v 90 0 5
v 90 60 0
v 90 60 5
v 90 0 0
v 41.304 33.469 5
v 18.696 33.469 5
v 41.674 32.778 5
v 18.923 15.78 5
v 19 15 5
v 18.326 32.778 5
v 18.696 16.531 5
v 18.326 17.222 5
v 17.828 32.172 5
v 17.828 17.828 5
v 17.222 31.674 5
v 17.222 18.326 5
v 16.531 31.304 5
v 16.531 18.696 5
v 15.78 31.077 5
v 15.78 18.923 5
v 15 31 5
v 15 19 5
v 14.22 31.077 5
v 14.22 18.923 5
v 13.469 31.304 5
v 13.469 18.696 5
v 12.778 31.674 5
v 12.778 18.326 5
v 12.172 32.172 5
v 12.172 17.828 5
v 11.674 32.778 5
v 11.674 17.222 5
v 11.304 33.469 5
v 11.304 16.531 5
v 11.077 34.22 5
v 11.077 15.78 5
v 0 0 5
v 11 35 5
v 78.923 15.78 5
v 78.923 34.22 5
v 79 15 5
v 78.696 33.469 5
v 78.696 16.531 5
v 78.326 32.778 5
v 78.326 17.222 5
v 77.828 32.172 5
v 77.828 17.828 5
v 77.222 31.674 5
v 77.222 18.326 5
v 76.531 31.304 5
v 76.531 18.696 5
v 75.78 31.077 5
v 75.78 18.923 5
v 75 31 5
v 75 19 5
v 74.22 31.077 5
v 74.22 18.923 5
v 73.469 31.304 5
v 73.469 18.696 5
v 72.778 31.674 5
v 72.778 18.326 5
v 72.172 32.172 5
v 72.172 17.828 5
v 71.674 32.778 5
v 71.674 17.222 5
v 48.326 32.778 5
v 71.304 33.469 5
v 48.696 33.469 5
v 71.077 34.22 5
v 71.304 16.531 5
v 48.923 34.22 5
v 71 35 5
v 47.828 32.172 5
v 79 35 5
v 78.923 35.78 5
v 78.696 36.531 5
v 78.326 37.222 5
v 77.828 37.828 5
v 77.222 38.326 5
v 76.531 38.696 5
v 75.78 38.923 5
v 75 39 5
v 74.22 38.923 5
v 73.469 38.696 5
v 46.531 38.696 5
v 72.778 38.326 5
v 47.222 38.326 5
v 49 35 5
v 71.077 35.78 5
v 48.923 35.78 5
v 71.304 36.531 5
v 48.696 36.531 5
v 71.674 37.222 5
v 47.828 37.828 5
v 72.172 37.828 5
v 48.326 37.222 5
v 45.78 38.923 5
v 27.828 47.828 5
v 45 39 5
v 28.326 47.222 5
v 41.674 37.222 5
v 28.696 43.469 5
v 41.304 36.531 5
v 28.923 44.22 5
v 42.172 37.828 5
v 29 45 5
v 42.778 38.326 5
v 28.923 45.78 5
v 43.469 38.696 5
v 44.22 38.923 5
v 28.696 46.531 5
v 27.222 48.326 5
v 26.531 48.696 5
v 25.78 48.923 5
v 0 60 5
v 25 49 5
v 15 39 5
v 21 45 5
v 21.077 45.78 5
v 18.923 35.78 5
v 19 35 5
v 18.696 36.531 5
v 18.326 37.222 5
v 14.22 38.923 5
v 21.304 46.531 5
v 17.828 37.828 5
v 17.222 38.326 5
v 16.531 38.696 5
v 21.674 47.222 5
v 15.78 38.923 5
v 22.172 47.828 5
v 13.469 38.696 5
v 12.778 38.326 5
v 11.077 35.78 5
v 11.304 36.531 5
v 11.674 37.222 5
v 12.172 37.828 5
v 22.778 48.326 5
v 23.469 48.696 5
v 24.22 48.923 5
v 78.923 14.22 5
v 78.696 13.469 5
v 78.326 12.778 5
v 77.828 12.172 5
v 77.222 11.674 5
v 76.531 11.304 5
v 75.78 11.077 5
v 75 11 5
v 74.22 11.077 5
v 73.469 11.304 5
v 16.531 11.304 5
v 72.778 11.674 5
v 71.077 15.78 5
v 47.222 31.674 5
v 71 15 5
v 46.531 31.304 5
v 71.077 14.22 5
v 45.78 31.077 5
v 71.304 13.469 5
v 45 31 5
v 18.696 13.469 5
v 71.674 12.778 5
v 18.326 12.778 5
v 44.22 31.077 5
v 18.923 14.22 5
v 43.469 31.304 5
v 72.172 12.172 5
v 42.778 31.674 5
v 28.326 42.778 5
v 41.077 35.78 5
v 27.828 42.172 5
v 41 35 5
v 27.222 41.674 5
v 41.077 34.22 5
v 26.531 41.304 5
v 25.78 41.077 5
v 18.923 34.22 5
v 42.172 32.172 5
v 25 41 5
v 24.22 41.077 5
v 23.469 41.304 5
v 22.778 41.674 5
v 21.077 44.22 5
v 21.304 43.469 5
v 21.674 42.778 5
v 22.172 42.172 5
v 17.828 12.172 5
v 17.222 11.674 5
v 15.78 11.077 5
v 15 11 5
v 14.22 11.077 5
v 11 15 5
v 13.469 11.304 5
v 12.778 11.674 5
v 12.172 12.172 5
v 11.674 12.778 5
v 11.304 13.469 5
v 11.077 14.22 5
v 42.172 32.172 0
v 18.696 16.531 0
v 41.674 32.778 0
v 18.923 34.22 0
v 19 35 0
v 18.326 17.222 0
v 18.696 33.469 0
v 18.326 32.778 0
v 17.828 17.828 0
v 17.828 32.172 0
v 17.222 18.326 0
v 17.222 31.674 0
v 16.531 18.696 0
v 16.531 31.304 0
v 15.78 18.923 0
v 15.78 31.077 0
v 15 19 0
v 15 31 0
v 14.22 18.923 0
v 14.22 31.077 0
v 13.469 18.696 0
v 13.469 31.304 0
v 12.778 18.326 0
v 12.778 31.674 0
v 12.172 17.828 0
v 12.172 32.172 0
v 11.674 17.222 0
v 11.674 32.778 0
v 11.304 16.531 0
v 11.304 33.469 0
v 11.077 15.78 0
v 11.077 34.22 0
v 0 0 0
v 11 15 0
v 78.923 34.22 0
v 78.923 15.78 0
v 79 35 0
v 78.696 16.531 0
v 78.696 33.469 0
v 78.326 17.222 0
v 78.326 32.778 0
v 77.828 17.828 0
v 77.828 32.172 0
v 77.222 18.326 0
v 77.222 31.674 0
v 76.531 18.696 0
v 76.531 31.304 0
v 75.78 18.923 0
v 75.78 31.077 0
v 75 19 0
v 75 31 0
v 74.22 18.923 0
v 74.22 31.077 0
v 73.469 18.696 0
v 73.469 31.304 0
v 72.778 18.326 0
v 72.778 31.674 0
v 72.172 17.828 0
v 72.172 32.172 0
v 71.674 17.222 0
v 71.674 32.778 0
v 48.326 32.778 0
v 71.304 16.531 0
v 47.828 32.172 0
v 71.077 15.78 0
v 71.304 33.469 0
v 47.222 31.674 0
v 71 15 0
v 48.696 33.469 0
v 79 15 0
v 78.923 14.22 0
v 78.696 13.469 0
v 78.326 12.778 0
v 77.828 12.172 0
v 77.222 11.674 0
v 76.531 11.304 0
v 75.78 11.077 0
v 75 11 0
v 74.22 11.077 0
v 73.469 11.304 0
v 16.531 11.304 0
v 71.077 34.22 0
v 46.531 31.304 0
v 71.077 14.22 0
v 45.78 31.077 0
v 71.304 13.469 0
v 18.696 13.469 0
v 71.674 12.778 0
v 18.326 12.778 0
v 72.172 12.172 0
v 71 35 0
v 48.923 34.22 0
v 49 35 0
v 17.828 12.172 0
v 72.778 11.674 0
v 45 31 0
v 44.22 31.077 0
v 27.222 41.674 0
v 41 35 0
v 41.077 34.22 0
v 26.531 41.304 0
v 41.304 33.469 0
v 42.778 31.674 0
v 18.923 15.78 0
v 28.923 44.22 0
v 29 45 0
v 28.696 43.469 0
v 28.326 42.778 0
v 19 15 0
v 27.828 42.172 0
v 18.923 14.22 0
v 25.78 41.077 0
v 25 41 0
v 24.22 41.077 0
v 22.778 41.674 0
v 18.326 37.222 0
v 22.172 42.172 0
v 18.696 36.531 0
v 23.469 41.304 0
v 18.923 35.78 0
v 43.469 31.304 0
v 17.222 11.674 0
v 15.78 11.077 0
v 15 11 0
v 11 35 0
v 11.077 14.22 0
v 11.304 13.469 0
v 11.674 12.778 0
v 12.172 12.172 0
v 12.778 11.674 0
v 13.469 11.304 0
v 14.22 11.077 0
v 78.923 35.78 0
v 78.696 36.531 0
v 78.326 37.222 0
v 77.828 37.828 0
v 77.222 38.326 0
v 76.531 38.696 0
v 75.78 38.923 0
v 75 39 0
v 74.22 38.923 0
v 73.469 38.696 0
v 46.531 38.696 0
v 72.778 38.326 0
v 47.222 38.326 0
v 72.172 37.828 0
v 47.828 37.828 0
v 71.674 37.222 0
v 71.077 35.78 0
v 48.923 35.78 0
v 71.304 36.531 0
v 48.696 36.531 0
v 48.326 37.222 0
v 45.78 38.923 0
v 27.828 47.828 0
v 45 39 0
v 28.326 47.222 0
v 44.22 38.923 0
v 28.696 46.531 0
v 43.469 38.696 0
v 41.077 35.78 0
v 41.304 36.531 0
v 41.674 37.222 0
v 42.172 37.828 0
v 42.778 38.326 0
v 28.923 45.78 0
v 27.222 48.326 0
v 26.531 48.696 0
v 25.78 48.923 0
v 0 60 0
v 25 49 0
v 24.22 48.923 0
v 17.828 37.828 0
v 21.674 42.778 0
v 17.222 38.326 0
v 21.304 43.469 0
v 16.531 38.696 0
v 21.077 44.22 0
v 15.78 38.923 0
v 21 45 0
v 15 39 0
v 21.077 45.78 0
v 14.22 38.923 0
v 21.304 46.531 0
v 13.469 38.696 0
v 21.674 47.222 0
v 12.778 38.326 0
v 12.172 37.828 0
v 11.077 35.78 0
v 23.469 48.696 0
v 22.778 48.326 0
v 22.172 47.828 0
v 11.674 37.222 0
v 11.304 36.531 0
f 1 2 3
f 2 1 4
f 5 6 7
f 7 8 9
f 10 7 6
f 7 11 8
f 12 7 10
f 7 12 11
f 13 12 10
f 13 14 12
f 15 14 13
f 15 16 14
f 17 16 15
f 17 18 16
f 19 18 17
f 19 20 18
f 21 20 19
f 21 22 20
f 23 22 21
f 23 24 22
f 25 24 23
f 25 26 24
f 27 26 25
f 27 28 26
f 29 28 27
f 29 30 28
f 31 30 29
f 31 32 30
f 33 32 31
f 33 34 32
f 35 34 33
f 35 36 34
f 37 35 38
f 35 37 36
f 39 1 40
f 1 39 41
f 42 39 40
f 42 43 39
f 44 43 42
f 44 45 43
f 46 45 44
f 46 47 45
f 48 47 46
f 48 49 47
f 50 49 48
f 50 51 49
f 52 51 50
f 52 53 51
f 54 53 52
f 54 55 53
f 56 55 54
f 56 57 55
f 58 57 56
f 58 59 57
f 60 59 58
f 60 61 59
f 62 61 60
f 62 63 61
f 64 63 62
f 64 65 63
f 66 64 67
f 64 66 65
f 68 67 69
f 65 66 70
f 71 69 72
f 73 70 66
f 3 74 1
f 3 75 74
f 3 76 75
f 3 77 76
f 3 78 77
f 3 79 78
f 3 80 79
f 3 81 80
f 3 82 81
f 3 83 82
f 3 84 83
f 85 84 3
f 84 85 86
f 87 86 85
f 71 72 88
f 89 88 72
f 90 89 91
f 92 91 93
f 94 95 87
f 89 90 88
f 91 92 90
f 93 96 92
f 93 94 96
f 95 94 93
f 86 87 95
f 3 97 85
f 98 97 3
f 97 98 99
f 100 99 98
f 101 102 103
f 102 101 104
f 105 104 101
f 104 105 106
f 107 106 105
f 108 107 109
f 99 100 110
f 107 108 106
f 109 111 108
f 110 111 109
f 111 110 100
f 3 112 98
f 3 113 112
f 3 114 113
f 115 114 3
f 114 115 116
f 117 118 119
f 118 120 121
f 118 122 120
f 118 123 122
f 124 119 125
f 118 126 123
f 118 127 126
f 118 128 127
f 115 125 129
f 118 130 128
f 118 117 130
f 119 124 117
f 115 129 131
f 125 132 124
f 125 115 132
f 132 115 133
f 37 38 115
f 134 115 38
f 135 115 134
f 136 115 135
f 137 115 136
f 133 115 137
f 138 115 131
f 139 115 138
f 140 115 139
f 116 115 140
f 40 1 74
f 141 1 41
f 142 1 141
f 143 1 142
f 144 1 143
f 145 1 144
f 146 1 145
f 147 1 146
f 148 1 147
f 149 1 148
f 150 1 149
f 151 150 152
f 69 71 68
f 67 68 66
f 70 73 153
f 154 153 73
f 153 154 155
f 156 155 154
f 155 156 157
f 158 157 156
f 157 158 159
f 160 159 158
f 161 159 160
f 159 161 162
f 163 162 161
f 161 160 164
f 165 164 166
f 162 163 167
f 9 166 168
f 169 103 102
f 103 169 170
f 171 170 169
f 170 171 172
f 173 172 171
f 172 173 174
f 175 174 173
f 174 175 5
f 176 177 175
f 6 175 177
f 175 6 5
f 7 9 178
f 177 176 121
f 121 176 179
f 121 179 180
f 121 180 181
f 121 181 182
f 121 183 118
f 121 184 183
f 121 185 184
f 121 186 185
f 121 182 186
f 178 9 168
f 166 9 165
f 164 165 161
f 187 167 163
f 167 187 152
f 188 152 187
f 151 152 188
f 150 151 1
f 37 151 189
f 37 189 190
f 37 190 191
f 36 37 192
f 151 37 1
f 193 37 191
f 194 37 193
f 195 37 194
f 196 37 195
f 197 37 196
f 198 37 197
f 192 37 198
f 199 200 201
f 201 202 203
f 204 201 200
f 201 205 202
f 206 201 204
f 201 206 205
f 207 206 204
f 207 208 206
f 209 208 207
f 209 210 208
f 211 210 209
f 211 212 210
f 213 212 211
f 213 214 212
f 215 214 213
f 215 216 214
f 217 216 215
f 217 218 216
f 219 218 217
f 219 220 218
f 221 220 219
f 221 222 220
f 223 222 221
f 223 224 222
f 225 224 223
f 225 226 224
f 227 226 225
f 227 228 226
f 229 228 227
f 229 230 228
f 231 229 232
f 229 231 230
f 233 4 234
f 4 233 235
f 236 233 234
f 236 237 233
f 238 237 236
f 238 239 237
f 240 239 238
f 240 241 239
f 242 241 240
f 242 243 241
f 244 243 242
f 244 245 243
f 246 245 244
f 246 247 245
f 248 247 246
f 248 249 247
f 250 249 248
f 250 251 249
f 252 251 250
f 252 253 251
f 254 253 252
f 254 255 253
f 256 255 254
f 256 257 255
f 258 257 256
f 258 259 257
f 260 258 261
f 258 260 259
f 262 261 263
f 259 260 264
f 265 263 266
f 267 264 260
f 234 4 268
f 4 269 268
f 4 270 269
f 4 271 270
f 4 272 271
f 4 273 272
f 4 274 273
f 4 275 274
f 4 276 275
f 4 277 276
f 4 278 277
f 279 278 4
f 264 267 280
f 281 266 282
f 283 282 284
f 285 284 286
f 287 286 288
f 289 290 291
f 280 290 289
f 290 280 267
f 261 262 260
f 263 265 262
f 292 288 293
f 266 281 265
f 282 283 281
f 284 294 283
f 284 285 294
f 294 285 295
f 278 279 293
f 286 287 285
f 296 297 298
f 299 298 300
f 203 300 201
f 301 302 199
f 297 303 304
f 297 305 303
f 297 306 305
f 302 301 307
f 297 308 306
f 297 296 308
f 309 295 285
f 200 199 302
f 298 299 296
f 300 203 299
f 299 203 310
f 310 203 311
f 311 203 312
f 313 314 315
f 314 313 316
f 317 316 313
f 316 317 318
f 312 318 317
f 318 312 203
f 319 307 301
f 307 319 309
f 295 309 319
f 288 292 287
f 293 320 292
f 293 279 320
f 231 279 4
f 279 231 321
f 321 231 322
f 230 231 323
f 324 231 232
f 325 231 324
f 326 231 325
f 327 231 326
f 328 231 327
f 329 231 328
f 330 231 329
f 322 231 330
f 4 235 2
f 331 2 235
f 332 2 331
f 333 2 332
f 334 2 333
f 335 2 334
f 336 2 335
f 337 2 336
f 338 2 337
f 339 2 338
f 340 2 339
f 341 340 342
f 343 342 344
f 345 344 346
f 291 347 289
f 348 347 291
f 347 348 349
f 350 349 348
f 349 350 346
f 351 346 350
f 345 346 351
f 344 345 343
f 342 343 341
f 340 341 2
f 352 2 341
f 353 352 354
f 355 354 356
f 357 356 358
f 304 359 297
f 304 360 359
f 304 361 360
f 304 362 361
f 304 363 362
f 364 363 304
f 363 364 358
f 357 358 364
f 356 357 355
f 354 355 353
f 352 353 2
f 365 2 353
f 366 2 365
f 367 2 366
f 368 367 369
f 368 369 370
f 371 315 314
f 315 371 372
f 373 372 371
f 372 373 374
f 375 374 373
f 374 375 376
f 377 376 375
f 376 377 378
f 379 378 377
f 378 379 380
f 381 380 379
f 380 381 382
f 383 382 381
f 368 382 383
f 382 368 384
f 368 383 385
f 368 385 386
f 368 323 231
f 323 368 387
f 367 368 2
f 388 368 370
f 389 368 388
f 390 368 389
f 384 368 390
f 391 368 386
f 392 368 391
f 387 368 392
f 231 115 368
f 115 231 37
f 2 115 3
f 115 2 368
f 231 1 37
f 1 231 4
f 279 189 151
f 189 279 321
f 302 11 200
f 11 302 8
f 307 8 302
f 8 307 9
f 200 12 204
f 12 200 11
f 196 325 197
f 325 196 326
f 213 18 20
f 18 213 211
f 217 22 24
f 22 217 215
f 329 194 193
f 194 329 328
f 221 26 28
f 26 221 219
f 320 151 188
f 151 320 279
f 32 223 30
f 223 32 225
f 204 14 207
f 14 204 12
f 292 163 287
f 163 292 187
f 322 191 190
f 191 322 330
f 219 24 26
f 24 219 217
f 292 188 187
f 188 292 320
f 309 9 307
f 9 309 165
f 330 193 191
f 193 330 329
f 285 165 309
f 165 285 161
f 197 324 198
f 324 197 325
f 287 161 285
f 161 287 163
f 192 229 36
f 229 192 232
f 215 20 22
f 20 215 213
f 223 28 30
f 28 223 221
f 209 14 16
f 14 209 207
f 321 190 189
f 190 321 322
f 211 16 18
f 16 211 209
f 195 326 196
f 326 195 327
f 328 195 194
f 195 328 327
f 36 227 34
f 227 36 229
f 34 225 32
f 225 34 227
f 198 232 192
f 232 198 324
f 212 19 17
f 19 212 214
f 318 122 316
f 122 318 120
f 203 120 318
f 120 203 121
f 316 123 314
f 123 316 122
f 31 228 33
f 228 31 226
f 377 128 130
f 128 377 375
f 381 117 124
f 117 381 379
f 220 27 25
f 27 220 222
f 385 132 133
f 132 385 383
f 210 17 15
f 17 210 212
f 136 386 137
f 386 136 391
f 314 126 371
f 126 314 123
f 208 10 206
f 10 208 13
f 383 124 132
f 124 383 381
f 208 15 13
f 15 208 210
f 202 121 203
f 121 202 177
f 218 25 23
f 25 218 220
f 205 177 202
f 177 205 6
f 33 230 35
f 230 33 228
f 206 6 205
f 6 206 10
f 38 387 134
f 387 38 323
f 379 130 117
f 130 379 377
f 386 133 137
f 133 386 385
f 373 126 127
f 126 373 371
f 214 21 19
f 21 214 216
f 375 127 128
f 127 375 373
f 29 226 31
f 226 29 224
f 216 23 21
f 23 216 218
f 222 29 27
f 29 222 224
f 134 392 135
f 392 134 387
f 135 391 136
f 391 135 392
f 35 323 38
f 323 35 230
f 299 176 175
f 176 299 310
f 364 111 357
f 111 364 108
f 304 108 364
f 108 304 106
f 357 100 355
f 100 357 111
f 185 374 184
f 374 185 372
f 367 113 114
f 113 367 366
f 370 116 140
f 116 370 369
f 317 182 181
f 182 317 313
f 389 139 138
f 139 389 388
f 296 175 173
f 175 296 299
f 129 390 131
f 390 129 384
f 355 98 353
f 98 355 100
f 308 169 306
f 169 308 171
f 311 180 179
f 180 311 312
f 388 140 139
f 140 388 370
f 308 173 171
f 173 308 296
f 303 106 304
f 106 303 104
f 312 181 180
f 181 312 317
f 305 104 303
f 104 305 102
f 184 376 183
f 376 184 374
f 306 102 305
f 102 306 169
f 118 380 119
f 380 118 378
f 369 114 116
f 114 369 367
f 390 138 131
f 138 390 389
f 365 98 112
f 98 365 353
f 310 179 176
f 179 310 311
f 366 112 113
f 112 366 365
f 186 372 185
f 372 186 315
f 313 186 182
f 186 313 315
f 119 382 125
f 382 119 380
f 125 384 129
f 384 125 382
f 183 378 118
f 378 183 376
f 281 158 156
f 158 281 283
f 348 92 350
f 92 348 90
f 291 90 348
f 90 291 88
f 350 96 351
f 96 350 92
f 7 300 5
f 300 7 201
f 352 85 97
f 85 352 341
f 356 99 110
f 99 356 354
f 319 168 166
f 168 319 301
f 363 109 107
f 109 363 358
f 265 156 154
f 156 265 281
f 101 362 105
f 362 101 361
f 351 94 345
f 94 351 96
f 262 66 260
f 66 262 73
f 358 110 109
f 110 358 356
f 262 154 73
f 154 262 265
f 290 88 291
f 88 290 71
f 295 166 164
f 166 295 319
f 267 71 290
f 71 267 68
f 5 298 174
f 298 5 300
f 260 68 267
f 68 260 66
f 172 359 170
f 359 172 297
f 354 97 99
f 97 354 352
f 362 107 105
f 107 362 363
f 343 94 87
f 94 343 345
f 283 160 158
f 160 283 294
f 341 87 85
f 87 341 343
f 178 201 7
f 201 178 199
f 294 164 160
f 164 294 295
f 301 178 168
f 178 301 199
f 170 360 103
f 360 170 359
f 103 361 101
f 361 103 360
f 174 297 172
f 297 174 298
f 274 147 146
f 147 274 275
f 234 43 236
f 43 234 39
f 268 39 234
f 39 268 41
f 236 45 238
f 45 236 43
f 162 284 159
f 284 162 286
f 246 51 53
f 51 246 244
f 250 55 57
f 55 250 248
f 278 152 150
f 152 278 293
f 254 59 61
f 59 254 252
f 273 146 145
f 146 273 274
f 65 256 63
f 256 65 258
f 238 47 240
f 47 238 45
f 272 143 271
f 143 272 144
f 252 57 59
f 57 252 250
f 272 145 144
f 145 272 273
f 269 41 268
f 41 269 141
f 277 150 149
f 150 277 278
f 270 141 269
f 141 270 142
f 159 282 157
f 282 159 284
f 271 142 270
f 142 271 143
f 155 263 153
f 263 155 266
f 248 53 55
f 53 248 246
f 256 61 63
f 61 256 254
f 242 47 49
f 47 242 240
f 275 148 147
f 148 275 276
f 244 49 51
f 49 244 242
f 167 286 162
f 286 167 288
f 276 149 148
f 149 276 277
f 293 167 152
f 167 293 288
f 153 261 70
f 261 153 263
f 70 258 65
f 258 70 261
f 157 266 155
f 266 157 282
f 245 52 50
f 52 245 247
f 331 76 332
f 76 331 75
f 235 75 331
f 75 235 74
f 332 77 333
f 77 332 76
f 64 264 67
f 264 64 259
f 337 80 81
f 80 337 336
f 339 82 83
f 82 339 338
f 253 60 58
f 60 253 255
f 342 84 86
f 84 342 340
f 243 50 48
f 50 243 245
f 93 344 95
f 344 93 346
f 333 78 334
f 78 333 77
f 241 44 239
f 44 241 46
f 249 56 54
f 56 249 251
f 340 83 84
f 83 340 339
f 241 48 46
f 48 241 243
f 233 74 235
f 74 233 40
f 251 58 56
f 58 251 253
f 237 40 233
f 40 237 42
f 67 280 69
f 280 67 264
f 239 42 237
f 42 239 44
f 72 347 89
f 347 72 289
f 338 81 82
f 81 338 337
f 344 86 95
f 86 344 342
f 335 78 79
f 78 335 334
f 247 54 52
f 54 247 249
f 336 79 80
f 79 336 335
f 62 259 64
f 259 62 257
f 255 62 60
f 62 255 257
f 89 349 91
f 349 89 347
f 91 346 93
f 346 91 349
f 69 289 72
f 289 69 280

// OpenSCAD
$fn = 32;

// ----------------------------------------------------------------------
// Hole field: plate with holes at given coordinates
// ----------------------------------------------------------------------

// --- parameters (mm) ---
plate_l = 90;             // plate length, X
plate_w = 60;             // plate width, Y
plate_t = 5;              // plate thickness, Z
hole_d = 8;               // hole diameter

difference() {
  cube([plate_l, plate_w, plate_t]);
  translate([15, 15, -1]) cylinder(h = plate_t + 2, d = hole_d);
  translate([15, 35, -1]) cylinder(h = plate_t + 2, d = hole_d);
  translate([25, 45, -1]) cylinder(h = plate_t + 2, d = hole_d);
  translate([45, 35, -1]) cylinder(h = plate_t + 2, d = hole_d);
  translate([75, 15, -1]) cylinder(h = plate_t + 2, d = hole_d);
  translate([75, 35, -1]) cylinder(h = plate_t + 2, d = hole_d);
}
